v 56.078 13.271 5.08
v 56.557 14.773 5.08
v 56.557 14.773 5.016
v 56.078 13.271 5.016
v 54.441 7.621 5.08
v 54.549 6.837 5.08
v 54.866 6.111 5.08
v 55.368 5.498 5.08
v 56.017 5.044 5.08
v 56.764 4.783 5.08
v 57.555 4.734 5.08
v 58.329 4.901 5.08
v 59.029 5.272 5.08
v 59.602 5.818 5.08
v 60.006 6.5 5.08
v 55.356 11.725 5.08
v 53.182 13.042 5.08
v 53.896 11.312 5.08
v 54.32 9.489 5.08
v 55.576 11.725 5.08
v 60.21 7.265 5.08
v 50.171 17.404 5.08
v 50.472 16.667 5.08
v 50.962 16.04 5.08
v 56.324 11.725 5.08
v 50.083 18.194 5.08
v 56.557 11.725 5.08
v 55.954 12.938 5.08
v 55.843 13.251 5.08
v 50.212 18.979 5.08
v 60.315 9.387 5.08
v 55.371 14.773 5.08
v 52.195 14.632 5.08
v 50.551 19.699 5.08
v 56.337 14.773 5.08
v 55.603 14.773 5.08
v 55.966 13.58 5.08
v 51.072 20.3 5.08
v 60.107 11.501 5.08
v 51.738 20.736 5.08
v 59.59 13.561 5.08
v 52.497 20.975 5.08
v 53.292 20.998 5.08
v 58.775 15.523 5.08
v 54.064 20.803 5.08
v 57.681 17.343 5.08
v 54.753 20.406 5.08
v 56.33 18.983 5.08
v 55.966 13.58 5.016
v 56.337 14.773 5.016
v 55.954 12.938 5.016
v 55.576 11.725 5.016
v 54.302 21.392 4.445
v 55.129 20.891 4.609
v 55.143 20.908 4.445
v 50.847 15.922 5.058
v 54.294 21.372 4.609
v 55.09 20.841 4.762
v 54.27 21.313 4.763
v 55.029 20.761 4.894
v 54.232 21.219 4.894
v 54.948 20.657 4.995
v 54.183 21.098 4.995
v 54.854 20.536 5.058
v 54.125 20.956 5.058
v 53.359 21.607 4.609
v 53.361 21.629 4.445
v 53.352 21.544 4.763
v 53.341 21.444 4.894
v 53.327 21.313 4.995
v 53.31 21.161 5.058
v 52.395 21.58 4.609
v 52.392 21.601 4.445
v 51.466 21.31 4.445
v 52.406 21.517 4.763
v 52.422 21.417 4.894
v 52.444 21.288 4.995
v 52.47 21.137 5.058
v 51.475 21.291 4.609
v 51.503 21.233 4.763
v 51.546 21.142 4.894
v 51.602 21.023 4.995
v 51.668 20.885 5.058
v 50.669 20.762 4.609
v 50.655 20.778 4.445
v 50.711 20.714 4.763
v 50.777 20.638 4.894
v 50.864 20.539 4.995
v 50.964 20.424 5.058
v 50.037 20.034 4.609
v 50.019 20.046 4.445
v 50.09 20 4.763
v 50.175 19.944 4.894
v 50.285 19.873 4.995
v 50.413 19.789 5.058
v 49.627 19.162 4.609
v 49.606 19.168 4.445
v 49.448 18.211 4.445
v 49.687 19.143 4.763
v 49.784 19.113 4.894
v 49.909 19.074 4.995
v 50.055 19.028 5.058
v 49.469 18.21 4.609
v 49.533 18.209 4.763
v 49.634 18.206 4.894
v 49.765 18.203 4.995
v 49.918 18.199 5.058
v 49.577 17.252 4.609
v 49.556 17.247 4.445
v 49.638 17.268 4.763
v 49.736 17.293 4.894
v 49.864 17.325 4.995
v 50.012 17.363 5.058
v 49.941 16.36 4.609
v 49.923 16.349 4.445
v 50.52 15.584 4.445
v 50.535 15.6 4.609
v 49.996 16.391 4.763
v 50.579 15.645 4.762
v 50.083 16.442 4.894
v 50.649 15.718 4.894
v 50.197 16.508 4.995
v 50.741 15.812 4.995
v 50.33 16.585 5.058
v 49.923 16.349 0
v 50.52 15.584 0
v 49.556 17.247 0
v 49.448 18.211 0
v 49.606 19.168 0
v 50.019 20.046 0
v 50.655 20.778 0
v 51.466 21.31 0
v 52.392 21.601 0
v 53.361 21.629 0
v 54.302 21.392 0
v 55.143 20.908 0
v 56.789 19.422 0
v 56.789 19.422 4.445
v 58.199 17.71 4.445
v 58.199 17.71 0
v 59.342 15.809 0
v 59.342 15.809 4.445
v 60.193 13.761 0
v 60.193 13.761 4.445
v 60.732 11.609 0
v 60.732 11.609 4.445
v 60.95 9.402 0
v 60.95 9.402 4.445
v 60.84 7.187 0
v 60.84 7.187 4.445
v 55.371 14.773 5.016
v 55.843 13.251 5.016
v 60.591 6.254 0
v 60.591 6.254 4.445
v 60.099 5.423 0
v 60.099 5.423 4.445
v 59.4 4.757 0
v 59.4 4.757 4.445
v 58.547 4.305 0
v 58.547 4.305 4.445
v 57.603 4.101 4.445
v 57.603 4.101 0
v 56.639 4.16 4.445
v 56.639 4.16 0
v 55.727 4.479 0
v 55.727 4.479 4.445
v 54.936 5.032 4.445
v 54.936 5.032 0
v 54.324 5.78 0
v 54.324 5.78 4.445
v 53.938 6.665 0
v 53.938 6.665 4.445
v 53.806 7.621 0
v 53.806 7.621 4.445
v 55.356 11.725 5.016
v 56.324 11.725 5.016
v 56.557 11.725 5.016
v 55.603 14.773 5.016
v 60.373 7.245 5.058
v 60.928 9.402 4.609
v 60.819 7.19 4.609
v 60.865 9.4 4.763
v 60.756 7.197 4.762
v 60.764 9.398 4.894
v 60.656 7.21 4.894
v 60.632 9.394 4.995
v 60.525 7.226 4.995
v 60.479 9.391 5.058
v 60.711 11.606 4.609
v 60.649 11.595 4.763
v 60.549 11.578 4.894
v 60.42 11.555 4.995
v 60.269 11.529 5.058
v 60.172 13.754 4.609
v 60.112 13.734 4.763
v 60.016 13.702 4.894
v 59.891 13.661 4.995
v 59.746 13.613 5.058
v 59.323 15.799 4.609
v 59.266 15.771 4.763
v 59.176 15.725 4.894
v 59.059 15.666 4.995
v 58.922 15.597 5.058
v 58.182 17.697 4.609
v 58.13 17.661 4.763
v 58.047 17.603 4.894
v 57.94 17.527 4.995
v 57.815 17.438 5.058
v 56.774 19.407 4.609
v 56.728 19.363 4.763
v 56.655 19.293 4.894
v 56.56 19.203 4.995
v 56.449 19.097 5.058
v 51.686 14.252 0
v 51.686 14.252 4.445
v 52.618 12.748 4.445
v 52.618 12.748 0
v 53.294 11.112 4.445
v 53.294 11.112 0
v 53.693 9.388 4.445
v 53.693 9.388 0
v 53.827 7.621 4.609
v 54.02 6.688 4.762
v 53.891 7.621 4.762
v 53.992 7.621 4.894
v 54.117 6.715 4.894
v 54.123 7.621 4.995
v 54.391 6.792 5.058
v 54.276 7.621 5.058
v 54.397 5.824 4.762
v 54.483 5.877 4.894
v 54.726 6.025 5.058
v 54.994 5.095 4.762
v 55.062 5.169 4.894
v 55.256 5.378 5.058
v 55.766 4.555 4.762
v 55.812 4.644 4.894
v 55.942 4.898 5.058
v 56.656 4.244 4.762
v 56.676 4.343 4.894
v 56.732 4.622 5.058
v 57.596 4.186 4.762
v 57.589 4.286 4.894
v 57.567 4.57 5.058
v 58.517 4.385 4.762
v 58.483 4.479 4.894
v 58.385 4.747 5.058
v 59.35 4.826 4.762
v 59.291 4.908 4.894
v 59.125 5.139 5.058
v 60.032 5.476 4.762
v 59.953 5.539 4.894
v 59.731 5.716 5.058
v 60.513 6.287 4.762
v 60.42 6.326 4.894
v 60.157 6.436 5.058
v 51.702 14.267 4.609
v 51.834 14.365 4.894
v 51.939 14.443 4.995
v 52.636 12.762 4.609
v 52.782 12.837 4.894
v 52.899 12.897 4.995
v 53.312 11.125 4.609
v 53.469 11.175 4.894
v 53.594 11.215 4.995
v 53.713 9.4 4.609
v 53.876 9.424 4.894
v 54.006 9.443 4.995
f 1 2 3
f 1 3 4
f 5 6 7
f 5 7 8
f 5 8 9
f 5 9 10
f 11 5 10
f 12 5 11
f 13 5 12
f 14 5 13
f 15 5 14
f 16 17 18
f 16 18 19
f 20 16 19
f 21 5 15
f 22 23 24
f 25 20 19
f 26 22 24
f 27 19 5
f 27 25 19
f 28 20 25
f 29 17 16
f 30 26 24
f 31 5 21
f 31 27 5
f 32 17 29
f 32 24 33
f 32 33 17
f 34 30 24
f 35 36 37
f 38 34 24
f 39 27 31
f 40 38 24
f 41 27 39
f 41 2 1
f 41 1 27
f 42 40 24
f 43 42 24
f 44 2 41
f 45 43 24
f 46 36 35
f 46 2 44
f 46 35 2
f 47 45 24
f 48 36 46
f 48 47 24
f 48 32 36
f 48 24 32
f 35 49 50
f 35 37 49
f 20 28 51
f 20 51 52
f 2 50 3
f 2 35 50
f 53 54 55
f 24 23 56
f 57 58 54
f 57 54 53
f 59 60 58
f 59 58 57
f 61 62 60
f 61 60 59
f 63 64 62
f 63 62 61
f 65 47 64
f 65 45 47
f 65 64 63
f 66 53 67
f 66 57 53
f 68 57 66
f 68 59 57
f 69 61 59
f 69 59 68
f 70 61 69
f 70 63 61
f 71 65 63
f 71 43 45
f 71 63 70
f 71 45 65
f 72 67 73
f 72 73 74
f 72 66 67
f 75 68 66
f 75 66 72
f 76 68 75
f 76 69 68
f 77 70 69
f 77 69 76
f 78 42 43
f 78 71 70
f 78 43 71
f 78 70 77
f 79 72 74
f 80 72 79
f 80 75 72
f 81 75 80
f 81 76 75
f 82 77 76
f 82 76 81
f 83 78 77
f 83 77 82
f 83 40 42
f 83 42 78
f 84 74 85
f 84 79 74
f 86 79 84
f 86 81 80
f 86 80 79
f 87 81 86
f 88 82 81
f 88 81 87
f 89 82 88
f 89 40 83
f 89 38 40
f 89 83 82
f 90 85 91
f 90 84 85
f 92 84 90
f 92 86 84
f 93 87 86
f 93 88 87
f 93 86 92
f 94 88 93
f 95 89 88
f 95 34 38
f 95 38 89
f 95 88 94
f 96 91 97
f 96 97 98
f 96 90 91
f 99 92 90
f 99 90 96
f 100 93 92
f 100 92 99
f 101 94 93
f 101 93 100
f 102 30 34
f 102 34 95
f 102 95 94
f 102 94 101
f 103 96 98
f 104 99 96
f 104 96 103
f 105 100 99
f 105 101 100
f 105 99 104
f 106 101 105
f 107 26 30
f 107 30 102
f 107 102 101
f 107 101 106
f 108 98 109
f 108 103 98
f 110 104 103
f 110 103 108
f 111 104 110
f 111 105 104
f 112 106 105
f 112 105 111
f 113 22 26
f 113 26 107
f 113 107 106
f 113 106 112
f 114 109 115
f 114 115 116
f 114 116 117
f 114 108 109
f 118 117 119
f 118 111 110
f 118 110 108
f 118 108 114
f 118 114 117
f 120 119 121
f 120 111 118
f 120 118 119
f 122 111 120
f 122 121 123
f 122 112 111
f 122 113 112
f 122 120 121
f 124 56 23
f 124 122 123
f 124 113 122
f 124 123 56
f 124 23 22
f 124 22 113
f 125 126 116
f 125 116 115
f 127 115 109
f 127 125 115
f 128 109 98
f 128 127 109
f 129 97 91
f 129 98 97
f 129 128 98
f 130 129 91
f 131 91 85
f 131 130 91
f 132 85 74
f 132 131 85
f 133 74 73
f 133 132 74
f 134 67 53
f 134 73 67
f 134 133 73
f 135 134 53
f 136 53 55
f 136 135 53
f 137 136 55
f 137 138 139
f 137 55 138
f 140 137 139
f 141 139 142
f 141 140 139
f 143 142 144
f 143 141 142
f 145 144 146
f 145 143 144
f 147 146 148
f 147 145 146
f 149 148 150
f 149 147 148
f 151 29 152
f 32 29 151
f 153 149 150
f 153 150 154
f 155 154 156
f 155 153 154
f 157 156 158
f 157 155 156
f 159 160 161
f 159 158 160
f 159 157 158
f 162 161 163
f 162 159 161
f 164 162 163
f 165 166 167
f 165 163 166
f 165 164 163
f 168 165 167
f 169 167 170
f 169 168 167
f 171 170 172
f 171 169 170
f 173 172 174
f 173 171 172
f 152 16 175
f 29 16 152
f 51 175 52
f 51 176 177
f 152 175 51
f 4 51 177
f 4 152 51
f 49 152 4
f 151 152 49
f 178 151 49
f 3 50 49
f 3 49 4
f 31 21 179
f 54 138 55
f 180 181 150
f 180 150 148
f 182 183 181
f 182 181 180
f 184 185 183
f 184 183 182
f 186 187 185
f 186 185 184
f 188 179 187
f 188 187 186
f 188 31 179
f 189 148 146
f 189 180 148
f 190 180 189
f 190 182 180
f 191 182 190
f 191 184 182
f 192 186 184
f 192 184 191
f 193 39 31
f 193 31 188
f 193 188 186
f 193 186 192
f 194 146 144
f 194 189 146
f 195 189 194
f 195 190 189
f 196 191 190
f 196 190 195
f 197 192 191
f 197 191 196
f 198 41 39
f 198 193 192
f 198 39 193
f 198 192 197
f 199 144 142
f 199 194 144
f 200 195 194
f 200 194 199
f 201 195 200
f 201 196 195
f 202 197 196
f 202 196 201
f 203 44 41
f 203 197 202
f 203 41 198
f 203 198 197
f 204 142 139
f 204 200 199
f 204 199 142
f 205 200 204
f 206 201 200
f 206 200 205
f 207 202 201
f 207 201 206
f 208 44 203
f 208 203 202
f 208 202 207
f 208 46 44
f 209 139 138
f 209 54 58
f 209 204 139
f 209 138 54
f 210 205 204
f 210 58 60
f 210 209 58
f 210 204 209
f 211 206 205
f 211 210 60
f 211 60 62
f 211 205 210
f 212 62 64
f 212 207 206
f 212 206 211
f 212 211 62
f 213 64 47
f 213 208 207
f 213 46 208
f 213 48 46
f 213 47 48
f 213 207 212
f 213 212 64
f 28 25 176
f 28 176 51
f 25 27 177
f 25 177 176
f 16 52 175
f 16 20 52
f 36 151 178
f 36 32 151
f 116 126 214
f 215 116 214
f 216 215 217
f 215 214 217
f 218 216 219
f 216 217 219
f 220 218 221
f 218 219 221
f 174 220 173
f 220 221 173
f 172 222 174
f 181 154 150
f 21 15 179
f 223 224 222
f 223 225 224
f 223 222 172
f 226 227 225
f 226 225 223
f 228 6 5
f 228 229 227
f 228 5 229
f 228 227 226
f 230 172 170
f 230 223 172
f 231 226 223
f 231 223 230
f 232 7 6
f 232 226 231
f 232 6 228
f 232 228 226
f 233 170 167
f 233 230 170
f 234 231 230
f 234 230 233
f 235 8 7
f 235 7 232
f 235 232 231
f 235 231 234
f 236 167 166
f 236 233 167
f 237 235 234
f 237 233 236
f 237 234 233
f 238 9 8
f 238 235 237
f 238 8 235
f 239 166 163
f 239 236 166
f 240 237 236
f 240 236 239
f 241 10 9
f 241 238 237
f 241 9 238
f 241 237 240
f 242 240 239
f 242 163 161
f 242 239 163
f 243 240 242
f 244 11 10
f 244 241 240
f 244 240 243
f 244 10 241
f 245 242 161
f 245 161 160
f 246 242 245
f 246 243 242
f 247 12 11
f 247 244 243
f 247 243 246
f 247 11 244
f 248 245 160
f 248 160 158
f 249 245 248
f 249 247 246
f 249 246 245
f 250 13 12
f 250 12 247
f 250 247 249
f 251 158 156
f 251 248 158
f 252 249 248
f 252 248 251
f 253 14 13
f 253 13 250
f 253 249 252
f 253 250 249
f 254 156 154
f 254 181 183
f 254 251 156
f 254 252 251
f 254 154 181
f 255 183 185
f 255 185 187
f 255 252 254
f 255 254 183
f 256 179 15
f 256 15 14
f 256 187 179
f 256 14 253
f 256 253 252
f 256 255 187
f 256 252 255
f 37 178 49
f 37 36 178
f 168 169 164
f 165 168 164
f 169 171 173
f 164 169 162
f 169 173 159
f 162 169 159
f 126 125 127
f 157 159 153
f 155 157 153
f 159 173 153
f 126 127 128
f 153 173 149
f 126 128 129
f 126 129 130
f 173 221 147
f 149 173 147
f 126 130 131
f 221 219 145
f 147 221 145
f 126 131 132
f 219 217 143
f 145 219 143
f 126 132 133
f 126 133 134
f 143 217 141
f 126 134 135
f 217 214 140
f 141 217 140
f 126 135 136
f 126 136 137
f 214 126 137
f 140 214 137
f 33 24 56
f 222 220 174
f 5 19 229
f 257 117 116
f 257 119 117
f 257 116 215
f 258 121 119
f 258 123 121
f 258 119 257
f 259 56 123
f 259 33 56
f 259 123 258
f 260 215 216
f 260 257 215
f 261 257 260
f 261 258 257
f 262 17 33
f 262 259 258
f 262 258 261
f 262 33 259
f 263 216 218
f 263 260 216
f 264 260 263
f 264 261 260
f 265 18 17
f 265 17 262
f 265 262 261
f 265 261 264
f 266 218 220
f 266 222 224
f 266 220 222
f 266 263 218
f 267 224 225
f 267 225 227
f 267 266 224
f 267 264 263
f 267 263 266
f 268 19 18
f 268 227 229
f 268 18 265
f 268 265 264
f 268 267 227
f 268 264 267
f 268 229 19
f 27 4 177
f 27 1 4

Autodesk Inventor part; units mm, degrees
ref_plane "YZ Plane" through (0, 0, 0) normal (1, 0, 0) x (0, 1, 0)
ref_plane "XZ Plane" through (0, 0, 0) normal (0, 1, 0) x (-1, 0, 0)
ref_plane "XY Plane" through (0, 0, 0) normal (0, 0, 1) x (1, 0, 0)
sketch "Sketch1" plane through (0, 0, 0) normal (0, 0, 1) x (1, 0, 0)
  arc A0 (53.8057, 7.6214) -> (60.8401, 7.187) centre (57.3363, 7.6214) ccw
  arc A1 (55.1426, 20.9078) -> (50.5197, 15.5843) centre (52.9772, 18.1193) ccw
  arc A2 (53.8057, 7.6214) -> (50.5197, 15.5843) centre (42.9913, 7.8181) ccw
  arc A3 (60.8401, 7.187) -> (55.1426, 20.9078) centre (45.9242, 9.0366) ccw
  dimension "d3" = 7.0612
  dimension "d4" = 7.0612
extrude "Extrusion1" add sketch "Sketch1" along normal blind 5.08
fillet "Fillet1" radius 0.635 4 edges at (57.1187, 4.0975, 5.08) (50.3114, 20.4341, 5.08) (52.9896, 11.9441, 5.08) (59.8052, 14.8006, 5.08)
sketch "Sketch2" plane through (0, 0, 5.08) normal (0, 0, 1) x (1, 0, 0)
  line L0 (55.3489, 14.773) -> (60.8716, 14.773) construction
  line L1 (60.8716, 14.773) -> (60.8716, 8.0828) construction
  line L2 (60.8716, 8.0828) -> (55.3489, 8.0828) construction
  line L3 (55.3489, 8.0828) -> (55.3489, 14.773) construction
  line L4 (56.5567, 11.725) -> (56.3245, 11.725)
  line L5 (56.3245, 11.725) -> (55.954, 12.9378)
  line L6 (55.954, 12.9378) -> (55.5761, 11.725)
  line L7 (55.5761, 11.725) -> (55.3563, 11.725)
  line L8 (55.3563, 11.725) -> (55.8429, 13.2514)
  line L9 (55.8429, 13.2514) -> (55.3711, 14.773)
  line L10 (55.3711, 14.773) -> (55.6033, 14.773)
  line L11 (55.6033, 14.773) -> (55.9664, 13.58)
  line L12 (55.9664, 13.58) -> (56.3369, 14.773)
  line L13 (56.3369, 14.773) -> (56.5567, 14.773)
  line L14 (56.5567, 14.773) -> (56.0775, 13.2712)
  line L15 (56.0775, 13.2712) -> (56.5567, 11.725)
  point P0 (0, 0)
extrude "Extrusion2" cut sketch "Sketch2" against normal blind 0.0635
properties part number "X Button"
